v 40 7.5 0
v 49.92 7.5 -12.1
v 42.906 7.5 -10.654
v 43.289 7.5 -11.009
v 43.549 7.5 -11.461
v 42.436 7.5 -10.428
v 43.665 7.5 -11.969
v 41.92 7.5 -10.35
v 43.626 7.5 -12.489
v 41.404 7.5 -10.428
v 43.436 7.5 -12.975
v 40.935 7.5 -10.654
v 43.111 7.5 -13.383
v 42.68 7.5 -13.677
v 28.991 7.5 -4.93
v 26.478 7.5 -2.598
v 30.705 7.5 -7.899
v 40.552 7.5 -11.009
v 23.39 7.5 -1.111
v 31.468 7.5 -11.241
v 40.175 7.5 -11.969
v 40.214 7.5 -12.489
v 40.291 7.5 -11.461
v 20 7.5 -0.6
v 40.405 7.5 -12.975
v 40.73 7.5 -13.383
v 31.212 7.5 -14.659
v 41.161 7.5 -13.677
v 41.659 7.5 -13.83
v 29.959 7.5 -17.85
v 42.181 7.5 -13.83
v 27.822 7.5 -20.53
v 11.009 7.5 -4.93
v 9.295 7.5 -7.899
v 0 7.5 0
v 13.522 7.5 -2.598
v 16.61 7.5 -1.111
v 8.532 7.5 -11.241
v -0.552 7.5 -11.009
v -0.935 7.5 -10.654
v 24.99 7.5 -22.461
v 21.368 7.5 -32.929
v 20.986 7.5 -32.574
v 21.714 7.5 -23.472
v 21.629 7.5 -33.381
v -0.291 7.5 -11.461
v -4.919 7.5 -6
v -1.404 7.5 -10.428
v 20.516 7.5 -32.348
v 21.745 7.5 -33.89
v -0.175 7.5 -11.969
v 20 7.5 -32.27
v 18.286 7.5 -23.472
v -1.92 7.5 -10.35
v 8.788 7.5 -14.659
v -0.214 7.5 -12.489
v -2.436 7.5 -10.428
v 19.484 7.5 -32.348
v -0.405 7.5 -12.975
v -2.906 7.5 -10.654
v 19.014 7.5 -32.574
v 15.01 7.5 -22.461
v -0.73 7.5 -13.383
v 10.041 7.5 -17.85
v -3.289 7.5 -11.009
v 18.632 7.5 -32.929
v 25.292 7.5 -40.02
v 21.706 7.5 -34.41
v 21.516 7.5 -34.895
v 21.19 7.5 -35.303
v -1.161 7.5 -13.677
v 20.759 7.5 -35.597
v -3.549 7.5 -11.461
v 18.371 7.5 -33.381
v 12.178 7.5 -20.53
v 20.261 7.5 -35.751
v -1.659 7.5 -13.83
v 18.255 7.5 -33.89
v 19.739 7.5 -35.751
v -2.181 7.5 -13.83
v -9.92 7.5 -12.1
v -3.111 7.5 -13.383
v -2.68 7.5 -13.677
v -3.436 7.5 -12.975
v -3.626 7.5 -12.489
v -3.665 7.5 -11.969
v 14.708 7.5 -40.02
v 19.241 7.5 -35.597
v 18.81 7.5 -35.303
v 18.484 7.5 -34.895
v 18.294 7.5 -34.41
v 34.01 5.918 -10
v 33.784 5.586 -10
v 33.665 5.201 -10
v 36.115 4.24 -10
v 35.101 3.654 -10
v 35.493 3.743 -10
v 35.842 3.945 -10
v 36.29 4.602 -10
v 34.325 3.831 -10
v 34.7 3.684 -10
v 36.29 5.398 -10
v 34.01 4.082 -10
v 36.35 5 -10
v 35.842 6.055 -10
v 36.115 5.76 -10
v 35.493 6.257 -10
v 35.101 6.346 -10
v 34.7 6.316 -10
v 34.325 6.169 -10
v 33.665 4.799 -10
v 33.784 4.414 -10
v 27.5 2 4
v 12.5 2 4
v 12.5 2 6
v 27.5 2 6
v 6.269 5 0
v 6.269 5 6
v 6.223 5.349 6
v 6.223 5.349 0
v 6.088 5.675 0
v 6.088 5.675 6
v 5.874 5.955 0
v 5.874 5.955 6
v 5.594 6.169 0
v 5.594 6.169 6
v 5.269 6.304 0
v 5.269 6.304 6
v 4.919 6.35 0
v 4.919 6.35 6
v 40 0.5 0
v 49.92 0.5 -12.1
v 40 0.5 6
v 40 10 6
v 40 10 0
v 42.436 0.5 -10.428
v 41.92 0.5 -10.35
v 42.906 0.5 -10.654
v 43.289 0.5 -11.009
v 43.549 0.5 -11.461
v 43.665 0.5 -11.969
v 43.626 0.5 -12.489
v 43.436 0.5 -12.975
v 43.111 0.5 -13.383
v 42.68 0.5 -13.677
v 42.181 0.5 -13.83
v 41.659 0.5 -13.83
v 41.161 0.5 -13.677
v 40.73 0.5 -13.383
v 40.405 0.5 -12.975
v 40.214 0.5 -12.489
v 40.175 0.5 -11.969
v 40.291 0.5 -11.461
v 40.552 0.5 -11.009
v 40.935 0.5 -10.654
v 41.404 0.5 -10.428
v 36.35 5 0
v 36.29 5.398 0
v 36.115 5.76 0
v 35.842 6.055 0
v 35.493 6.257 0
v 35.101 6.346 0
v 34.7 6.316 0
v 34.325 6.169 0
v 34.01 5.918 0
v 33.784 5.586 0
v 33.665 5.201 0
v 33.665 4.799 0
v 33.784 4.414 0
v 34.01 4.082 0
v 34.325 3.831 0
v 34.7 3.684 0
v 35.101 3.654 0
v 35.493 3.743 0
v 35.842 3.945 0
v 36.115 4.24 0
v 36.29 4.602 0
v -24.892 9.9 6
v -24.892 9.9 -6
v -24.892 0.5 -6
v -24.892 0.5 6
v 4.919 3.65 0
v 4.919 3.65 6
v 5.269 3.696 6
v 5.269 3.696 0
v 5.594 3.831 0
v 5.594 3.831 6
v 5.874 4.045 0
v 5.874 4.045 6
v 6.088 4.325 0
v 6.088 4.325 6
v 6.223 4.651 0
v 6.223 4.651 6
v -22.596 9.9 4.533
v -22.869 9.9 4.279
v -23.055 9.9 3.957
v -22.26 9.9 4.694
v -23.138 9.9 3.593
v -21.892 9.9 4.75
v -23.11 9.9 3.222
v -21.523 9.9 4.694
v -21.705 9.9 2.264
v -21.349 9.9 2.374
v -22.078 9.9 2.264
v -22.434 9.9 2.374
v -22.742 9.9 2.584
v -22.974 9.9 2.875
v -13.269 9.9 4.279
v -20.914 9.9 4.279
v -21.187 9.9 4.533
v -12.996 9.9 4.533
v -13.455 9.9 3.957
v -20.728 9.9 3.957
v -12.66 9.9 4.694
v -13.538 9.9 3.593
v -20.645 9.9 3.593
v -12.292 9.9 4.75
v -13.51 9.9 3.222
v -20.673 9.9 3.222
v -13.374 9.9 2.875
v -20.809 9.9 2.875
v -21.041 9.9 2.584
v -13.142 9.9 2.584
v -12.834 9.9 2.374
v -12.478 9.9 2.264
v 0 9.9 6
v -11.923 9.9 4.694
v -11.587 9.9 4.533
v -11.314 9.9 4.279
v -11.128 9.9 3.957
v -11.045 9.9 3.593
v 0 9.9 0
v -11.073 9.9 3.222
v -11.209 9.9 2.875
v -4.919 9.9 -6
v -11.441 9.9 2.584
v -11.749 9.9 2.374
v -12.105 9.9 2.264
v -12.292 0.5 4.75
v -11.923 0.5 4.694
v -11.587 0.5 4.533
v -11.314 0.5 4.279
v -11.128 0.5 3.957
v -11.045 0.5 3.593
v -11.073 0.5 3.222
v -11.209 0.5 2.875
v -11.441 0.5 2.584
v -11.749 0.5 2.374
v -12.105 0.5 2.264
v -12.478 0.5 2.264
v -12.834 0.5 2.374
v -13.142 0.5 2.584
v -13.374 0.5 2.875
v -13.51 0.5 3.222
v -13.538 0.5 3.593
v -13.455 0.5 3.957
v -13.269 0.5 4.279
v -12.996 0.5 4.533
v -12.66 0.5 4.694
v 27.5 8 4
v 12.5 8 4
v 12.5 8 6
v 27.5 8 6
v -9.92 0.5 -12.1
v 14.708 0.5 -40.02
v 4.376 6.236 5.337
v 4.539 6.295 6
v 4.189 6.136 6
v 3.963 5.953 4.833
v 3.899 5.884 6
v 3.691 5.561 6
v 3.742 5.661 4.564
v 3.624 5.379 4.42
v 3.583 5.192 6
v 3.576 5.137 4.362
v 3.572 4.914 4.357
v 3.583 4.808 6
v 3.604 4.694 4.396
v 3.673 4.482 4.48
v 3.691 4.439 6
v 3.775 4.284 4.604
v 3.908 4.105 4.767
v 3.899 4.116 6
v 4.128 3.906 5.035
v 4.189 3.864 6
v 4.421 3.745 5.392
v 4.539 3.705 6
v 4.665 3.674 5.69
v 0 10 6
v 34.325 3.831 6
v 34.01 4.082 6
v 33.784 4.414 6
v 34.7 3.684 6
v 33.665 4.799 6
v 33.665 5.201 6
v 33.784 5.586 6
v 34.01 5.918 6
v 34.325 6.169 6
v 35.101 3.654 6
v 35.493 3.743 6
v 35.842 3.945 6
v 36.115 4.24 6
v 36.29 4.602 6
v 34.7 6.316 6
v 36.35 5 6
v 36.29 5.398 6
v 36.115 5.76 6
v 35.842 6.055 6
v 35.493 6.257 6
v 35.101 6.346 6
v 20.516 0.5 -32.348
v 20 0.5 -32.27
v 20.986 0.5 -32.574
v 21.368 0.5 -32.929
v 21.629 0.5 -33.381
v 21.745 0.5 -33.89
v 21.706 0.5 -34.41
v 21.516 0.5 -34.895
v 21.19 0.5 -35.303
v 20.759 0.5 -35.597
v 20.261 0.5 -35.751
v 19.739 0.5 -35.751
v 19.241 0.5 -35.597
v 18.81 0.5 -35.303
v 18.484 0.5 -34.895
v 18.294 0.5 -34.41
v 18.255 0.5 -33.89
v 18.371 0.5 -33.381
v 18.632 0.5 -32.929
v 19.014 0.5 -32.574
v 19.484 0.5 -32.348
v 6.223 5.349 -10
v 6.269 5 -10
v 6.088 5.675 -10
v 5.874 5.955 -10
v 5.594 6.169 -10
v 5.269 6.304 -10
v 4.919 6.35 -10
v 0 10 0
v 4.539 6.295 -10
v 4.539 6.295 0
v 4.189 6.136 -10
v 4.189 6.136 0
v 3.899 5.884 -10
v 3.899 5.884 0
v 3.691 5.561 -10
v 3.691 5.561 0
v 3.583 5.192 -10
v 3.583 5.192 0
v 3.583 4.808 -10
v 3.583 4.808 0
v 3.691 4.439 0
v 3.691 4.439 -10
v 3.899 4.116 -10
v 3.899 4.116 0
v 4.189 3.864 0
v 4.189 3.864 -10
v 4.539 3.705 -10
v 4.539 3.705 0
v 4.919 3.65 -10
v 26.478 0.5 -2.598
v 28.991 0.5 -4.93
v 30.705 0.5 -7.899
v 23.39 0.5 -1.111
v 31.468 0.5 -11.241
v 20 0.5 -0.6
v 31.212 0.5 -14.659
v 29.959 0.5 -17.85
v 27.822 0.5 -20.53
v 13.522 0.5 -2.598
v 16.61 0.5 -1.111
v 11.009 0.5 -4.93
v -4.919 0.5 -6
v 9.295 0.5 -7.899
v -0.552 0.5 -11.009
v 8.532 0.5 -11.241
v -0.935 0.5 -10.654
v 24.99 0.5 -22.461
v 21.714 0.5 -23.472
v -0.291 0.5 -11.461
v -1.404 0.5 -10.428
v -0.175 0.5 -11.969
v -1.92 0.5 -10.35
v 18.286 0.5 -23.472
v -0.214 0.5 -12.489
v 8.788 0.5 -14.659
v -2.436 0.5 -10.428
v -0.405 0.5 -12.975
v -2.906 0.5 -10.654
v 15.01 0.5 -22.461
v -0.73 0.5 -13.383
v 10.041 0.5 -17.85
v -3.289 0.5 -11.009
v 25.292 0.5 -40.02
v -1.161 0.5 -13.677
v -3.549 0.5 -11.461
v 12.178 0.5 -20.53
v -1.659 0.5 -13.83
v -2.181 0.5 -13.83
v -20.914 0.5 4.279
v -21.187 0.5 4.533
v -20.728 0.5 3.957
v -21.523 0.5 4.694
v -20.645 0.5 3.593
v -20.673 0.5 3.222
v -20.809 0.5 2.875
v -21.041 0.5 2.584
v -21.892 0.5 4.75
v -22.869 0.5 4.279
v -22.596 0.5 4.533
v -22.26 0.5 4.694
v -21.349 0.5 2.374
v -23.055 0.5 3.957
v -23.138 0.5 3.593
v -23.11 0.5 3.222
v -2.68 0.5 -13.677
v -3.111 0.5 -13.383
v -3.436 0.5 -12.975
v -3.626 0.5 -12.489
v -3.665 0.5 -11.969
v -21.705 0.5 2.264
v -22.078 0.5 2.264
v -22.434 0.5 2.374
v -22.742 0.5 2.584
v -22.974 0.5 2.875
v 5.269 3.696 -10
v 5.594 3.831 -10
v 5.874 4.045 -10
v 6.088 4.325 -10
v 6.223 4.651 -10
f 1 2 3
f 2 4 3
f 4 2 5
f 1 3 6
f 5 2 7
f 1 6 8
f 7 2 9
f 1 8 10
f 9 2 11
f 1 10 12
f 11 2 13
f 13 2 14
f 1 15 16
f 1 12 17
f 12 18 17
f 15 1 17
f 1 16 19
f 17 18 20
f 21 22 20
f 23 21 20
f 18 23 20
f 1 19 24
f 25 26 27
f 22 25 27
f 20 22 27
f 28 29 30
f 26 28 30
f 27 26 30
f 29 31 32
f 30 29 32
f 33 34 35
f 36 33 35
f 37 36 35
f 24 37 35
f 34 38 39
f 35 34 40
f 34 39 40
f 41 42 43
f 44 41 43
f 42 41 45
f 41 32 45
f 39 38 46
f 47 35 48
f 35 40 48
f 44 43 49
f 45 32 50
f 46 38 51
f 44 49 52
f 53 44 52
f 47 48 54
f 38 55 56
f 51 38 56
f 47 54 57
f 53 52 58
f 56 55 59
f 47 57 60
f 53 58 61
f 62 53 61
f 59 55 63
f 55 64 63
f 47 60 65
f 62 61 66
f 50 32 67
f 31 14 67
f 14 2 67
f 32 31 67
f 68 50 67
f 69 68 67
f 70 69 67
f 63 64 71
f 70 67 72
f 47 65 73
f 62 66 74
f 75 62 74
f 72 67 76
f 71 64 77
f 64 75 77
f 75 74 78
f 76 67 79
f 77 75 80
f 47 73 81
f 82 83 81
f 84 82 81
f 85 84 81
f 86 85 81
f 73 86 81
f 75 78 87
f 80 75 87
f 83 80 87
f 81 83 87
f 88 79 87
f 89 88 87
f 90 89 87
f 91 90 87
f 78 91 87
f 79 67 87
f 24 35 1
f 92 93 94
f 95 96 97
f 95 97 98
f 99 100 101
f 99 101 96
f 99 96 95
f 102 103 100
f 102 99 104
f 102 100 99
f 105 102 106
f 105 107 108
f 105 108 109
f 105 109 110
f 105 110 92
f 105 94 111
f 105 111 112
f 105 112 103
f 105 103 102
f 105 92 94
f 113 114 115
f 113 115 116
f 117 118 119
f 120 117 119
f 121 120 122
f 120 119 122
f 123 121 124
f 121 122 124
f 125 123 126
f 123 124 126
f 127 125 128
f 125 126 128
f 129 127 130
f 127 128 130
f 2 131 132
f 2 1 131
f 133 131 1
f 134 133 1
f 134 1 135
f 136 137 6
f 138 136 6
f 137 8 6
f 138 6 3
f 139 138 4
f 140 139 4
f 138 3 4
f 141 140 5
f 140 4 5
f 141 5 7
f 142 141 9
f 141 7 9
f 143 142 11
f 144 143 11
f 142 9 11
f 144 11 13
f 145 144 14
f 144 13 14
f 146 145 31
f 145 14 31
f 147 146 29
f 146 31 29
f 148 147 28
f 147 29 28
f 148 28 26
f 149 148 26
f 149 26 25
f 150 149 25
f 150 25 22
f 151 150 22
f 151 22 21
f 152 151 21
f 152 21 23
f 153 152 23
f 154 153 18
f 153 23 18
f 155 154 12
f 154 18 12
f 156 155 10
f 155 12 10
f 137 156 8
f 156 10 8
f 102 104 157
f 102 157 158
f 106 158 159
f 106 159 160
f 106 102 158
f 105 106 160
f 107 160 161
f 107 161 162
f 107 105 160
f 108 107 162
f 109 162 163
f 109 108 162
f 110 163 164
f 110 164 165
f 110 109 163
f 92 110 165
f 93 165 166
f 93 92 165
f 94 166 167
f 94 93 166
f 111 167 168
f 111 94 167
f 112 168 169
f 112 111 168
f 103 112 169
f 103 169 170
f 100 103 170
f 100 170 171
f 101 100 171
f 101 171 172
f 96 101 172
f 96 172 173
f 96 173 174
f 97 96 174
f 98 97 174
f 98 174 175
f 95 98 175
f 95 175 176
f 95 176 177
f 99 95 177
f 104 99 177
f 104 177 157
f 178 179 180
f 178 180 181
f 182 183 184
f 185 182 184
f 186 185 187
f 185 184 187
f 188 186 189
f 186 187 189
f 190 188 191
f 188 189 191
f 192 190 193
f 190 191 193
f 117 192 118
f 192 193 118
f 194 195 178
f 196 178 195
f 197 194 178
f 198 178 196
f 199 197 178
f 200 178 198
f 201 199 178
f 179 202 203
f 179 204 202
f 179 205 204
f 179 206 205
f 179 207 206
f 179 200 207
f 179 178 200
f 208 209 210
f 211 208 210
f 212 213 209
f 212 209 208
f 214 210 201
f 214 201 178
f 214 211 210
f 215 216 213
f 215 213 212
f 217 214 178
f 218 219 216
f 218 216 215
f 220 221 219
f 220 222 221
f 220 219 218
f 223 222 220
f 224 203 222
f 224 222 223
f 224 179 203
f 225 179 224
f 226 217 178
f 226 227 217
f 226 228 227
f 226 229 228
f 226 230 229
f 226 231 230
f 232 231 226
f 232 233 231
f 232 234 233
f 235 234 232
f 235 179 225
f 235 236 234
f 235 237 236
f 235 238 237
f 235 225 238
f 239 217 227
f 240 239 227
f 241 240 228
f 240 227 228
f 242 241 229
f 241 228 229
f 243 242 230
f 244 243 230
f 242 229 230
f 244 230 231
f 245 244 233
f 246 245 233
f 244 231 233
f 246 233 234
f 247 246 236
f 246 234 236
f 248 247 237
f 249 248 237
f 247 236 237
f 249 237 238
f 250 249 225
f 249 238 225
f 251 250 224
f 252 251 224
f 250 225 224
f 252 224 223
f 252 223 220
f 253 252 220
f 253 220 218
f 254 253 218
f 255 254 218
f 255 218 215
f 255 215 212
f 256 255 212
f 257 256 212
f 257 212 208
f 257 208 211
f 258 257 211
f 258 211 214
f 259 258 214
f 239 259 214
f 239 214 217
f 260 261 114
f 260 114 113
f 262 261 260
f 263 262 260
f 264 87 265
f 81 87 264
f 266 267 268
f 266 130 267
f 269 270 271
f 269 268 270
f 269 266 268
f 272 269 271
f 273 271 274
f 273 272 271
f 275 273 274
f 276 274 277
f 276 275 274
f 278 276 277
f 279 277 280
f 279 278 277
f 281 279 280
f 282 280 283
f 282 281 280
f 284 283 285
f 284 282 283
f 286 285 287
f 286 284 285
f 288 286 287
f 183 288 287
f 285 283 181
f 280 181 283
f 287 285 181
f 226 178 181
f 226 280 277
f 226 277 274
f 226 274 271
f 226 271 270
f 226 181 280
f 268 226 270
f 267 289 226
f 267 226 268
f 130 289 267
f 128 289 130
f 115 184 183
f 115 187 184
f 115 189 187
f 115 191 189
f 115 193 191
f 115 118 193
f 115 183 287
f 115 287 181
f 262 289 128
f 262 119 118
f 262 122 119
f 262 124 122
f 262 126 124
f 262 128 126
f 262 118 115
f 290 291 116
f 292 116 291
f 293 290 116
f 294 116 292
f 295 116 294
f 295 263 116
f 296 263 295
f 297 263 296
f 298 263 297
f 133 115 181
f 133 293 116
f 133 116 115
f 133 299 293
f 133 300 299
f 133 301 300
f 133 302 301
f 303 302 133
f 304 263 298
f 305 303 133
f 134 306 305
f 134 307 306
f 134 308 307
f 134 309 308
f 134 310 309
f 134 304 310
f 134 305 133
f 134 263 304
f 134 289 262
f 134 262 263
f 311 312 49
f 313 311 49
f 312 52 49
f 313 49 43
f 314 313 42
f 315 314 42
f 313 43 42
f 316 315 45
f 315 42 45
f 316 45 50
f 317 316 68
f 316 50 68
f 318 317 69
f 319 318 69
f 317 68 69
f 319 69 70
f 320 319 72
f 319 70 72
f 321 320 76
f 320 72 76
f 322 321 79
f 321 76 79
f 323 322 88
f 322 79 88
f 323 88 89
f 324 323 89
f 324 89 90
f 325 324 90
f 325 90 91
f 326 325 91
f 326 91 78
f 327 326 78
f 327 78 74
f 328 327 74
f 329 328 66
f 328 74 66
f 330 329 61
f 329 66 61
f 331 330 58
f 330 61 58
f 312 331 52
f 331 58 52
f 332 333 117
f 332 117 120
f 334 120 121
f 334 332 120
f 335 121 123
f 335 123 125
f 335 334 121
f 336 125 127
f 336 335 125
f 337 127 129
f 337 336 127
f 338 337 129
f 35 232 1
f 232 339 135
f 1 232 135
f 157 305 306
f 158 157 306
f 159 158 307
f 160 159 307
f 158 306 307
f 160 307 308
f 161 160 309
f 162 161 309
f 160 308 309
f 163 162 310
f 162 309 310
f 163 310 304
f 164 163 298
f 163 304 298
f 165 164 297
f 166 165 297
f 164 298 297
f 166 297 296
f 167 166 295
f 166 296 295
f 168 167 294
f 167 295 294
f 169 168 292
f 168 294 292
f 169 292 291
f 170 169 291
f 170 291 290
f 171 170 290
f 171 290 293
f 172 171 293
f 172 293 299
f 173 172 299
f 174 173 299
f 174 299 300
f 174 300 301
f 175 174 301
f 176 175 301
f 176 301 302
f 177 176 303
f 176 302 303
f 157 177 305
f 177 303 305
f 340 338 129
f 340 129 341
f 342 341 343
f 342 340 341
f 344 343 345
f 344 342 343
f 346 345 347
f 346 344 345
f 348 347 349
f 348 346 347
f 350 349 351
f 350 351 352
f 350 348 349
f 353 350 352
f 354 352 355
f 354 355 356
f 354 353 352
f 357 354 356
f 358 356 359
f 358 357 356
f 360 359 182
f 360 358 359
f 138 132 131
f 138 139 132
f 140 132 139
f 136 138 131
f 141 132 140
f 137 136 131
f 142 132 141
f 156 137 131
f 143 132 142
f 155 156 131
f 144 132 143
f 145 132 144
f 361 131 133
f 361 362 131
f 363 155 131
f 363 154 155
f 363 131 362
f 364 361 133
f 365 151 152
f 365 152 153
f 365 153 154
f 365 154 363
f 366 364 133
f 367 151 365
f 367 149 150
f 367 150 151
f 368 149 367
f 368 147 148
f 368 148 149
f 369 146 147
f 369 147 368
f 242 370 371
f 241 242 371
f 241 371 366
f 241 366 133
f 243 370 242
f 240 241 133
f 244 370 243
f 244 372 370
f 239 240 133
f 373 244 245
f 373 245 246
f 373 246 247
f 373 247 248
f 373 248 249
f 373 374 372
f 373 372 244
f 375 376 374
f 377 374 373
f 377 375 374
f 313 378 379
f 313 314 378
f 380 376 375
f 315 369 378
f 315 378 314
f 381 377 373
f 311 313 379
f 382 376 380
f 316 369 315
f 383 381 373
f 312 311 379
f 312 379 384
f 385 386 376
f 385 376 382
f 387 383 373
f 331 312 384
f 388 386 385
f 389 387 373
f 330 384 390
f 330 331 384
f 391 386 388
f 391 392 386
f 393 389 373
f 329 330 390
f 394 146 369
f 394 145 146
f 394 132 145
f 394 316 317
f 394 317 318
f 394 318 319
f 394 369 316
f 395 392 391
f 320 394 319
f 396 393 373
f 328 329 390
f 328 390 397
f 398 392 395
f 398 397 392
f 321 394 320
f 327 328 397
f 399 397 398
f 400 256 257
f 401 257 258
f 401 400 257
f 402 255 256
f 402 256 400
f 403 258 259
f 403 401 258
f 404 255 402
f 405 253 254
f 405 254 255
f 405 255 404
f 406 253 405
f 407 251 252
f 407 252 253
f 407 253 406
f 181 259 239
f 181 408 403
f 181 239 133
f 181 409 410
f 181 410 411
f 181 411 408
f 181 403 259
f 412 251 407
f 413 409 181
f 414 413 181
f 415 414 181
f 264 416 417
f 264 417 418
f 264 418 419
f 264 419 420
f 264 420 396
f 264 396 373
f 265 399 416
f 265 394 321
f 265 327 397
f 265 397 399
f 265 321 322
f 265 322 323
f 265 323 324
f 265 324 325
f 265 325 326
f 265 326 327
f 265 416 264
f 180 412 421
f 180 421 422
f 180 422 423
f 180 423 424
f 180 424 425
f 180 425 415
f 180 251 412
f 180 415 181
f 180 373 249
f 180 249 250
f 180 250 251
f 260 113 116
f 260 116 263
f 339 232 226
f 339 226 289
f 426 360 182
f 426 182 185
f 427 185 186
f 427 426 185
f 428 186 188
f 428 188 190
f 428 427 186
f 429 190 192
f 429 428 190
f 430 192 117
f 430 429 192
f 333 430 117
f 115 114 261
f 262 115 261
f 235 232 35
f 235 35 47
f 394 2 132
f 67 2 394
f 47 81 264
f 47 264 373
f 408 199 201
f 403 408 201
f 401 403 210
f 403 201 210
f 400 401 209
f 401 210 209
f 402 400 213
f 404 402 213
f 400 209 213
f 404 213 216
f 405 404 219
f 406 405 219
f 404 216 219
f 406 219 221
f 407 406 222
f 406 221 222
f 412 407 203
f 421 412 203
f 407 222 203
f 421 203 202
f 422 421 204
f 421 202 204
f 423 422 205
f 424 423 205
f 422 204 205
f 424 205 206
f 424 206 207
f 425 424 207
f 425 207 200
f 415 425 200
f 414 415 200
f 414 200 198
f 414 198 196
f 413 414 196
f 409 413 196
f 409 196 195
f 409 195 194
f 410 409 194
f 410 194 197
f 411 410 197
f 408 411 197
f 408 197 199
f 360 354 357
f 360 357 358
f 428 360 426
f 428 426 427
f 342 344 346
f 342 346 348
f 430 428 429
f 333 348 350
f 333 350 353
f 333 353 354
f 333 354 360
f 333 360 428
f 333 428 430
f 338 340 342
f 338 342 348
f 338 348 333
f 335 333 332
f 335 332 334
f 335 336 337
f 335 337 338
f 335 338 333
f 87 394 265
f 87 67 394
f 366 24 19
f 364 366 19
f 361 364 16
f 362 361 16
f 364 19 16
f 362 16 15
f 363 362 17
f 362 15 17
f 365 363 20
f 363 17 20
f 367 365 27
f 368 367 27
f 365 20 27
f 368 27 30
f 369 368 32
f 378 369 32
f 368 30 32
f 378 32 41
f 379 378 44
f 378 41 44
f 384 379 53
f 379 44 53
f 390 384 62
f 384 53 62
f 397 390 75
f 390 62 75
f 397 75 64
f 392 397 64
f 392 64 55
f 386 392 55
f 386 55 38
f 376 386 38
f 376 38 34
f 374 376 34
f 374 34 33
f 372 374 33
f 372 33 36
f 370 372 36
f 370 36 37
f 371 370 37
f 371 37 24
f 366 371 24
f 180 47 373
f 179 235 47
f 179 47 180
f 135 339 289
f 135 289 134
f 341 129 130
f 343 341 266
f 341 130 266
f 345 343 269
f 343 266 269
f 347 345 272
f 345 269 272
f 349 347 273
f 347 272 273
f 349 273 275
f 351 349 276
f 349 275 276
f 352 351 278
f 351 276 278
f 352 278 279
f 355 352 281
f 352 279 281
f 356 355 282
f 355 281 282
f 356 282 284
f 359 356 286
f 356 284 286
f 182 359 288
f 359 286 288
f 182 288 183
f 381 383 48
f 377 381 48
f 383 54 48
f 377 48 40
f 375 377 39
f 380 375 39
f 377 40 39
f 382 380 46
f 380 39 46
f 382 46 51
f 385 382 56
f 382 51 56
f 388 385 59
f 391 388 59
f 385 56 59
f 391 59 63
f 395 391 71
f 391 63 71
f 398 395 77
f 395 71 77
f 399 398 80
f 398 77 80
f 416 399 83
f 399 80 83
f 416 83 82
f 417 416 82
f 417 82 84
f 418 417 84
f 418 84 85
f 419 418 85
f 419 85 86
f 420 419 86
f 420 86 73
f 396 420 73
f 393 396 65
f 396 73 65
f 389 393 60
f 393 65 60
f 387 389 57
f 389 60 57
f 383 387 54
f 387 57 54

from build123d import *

# Parameters (mm, degrees)
SKETCH1_W               = 40
SKETCH1_H               = 10
SKETCH1_R               = 1.5
SKETCH1_W_2             = 15
SKETCH1_H_2             = 6
BOSS_EXTRUDE1_DEPTH     = 6
SKETCH1_3_W             = 15
SKETCH1_3_H             = 6
BOSS_EXTRUDE2_DEPTH     = 4
BOSS_EXTRUDE3_START     = -2.5
SKETCH2_R               = 1.75
SKETCH2_R_2             = 11.5
BOSS_EXTRUDE3_DEPTH     = 5
SKETCH3_W               = 40
SKETCH3_H               = 6
CUT_EXTRUDE1_DEPTH      = 0.5
BOSS_EXTRUDE4_START     = -7.5
SKETCH2_3_R             = 1.75
SKETCH2_3_R_2           = 11.5
BOSS_EXTRUDE4_DEPTH     = 2
SKETCH4_R               = 1.25
BOSS_EXTRUDE5_DEPTH     = 7
BOSS_EXTRUDE6_START     = 2.4
SKETCH4_3_R             = 1.25
BOSS_EXTRUDE6_DEPTH     = 2.4
SKETCH5_R               = 2.902241855
SKETCH5_R_2             = 1.35
SKETCH5_R_3             = 2.755762568
BOSS_EXTRUDE7_DEPTH     = 6
CUT_EXTRUDE2_DEPTH      = 69.628757271
CUT_EXTRUDE2_DEPTH_BACK = 16
SKETCH5_2_R             = 1.35


with BuildPart() as part:
    # Sketch1 → Boss-Extrude1 (new body)
    with BuildSketch(Plane.XY):
        with Locations((20, 5)):
            Rectangle(SKETCH1_W, SKETCH1_H)
        with Locations((5, 5)):
            Circle(SKETCH1_R, mode=Mode.SUBTRACT)
        with Locations((35, 5)):
            Circle(SKETCH1_R, mode=Mode.SUBTRACT)
        with Locations((20, 5)):
            Rectangle(SKETCH1_W_2, SKETCH1_H_2, mode=Mode.SUBTRACT)
    extrude(amount=BOSS_EXTRUDE1_DEPTH)

    # Sketch1<3> → Boss-Extrude2 (add)
    with BuildSketch(Plane.XY):
        with Locations((20, 5)):
            Rectangle(SKETCH1_3_W, SKETCH1_3_H)
    extrude(amount=BOSS_EXTRUDE2_DEPTH)

    # Sketch2 → Boss-Extrude3 (add)
    # profile 1 of 2: a face of its own
    with BuildSketch(Plane(origin=(0, 10, 0), x_dir=(1, 0, 0), z_dir=(0, 1, 0)).offset(BOSS_EXTRUDE3_START)):
        with BuildLine():
            Line((0, 0), (8, 0))
            Line((8, 0), (8, 12.1))
            ThreePointArc((8, 12.1), (20, 24.1), (32, 12.1))
            Line((32, 12.1), (32, 0))
            Line((32, 0), (40, 0))
            Line((40, 0), (49.920310217, 12.1))
            Line((49.920310217, 12.1), (25.291502622, 40.020310217))
            Line((25.291502622, 40.020310217), (14.708497378, 40.020310217))
            Line((14.708497378, 40.020310217), (-9.920310217, 12.1))
            Line((-9.920310217, 12.1), (0, 0))
        make_face()
        with Locations(Location((-1.920310217, 12.1, 0), (0, 0, 270))):
            Circle(SKETCH2_R, mode=Mode.SUBTRACT)
        with Locations(Location((41.920310217, 12.1, 0), (0, 0, 270))):
            Circle(SKETCH2_R, mode=Mode.SUBTRACT)
        with Locations(Location((20, 34.020310217, 0), (0, 0, 270))):
            Circle(SKETCH2_R, mode=Mode.SUBTRACT)
    # profile 2 of 2: a face of its own
    with BuildSketch(Plane(origin=(0, 10, 0), x_dir=(1, 0, 0), z_dir=(0, 1, 0)).offset(BOSS_EXTRUDE3_START)):
        with BuildLine():
            Line((8, 12.1), (8, 0))
            Line((8, 0), (32, 0))
            Line((32, 0), (32, 12.1))
            ThreePointArc((32, 12.1), (20, 24.1), (8, 12.1))
        make_face()
        with Locations(Location((20, 12.1, 0), (0, 0, 270))):
            Circle(SKETCH2_R_2, mode=Mode.SUBTRACT)
    extrude(amount=-BOSS_EXTRUDE3_DEPTH)

    # Sketch3 → Cut-Extrude1 (cut)
    with BuildSketch(Plane(origin=(0, 0, 0), x_dir=(1, 0, 0), z_dir=(0, 1, 0))):
        with Locations((20, -3)):
            Rectangle(SKETCH3_W, SKETCH3_H)
    extrude(amount=CUT_EXTRUDE1_DEPTH, mode=Mode.SUBTRACT)

    # Sketch2<3> → Boss-Extrude4 (add)
    # profile 1 of 2: a face of its own
    with BuildSketch(Plane(origin=(0, 10, 0), x_dir=(1, 0, 0), z_dir=(0, 1, 0)).offset(BOSS_EXTRUDE4_START)):
        with BuildLine():
            Line((0, 0), (8, 0))
            Line((8, 0), (8, 12.1))
            ThreePointArc((8, 12.1), (20, 24.1), (32, 12.1))
            Line((32, 12.1), (32, 0))
            Line((32, 0), (40, 0))
            Line((40, 0), (49.920310217, 12.1))
            Line((49.920310217, 12.1), (25.291502622, 40.020310217))
            Line((25.291502622, 40.020310217), (14.708497378, 40.020310217))
            Line((14.708497378, 40.020310217), (-9.920310217, 12.1))
            Line((-9.920310217, 12.1), (0, 0))
        make_face()
        with Locations(Location((-1.920310217, 12.1, 0), (0, 0, 270))):
            Circle(SKETCH2_3_R, mode=Mode.SUBTRACT)
        with Locations(Location((41.920310217, 12.1, 0), (0, 0, 270))):
            Circle(SKETCH2_3_R, mode=Mode.SUBTRACT)
        with Locations(Location((20, 34.020310217, 0), (0, 0, 270))):
            Circle(SKETCH2_3_R, mode=Mode.SUBTRACT)
    # profile 2 of 2: a face of its own
    with BuildSketch(Plane(origin=(0, 10, 0), x_dir=(1, 0, 0), z_dir=(0, 1, 0)).offset(BOSS_EXTRUDE4_START)):
        with BuildLine():
            Line((8, 12.1), (8, 0))
            Line((8, 0), (32, 0))
            Line((32, 0), (32, 12.1))
            ThreePointArc((32, 12.1), (20, 24.1), (8, 12.1))
        make_face()
        with Locations(Location((20, 12.1, 0), (0, 0, 270))):
            Circle(SKETCH2_3_R_2, mode=Mode.SUBTRACT)
    extrude(amount=-BOSS_EXTRUDE4_DEPTH)

    # Sketch4 → Boss-Extrude5 (add)
    with BuildSketch(Plane(origin=(0, 7.5, 0), x_dir=(1, 0, 0), z_dir=(0, 1, 0))):
        Polygon((-25.886515965, -6), (-24.891502622, -6), (-24.891502622, 6), (-15.301186187, 6), (-4.919162091, 6), (4.919162091, -6), align=None)
        with Locations(Location((-21.891502622, -3.5, 0), (0, 0, 270))):
            Circle(SKETCH4_R, mode=Mode.SUBTRACT)
        with Locations(Location((-12.291502622, -3.5, 0), (0, 0, 270))):
            Circle(SKETCH4_R, mode=Mode.SUBTRACT)
    extrude(amount=-BOSS_EXTRUDE5_DEPTH)

    # Sketch4<3> → Boss-Extrude6 (add)
    with BuildSketch(Plane(origin=(0, 7.5, 0), x_dir=(1, 0, 0), z_dir=(0, 1, 0)).offset(BOSS_EXTRUDE6_START)):
        Polygon((-24.891502622, 6), (-24.891502622, -6), (4.919162091, -6), (0, 0), (-4.919162091, 6), (-15.301186187, 6), align=None)
        with Locations(Location((-21.891502622, -3.5, 0), (0, 0, 270))):
            Circle(SKETCH4_3_R, mode=Mode.SUBTRACT)
        with Locations(Location((-12.291502622, -3.5, 0), (0, 0, 270))):
            Circle(SKETCH4_3_R, mode=Mode.SUBTRACT)
    extrude(amount=-BOSS_EXTRUDE6_DEPTH)

    # Sketch5 → Boss-Extrude7 (add)
    # profile 1 of 2: a face of its own
    with BuildSketch(Plane.XY.offset(6)):
        with Locations((4.919162091, 5)):
            Circle(SKETCH5_R)
        with Locations(Location((4.919162091, 5, 0), (0, 0, 90))):
            Circle(SKETCH5_R_2, mode=Mode.SUBTRACT)
    # profile 2 of 2: a face of its own
    with BuildSketch(Plane.XY.offset(6)):
        with Locations((35, 5)):
            Circle(SKETCH5_R_3)
        with Locations((35, 5)):
            Circle(SKETCH5_R_2, mode=Mode.SUBTRACT)
    extrude(amount=-BOSS_EXTRUDE7_DEPTH)

    # Sketch5<2> → Cut-Extrude2 (cut, two sides: drawn at the far end of the back side and taken through both)
    with BuildSketch(Plane.XY.offset(6).offset(-CUT_EXTRUDE2_DEPTH_BACK)):
        with BuildLine():
            ThreePointArc((4.919162091, 3.65), (5.873756246, 4.045405845), (6.269162091, 5))
            ThreePointArc((6.269162091, 5), (5.873756246, 5.954594155), (4.919162091, 6.35))
            Line((4.919162091, 6.35), (4.919162091, 3.65))
        make_face()
        with BuildLine():
            Line((4.919162091, 3.65), (4.919162091, 6.35))
            ThreePointArc((4.919162091, 6.35), (3.569162091, 5), (4.919162091, 3.65))
        make_face()
        with Locations((35, 5)):
            Circle(SKETCH5_2_R)
    extrude(amount=CUT_EXTRUDE2_DEPTH + CUT_EXTRUDE2_DEPTH_BACK, mode=Mode.SUBTRACT)


solid = part.part
